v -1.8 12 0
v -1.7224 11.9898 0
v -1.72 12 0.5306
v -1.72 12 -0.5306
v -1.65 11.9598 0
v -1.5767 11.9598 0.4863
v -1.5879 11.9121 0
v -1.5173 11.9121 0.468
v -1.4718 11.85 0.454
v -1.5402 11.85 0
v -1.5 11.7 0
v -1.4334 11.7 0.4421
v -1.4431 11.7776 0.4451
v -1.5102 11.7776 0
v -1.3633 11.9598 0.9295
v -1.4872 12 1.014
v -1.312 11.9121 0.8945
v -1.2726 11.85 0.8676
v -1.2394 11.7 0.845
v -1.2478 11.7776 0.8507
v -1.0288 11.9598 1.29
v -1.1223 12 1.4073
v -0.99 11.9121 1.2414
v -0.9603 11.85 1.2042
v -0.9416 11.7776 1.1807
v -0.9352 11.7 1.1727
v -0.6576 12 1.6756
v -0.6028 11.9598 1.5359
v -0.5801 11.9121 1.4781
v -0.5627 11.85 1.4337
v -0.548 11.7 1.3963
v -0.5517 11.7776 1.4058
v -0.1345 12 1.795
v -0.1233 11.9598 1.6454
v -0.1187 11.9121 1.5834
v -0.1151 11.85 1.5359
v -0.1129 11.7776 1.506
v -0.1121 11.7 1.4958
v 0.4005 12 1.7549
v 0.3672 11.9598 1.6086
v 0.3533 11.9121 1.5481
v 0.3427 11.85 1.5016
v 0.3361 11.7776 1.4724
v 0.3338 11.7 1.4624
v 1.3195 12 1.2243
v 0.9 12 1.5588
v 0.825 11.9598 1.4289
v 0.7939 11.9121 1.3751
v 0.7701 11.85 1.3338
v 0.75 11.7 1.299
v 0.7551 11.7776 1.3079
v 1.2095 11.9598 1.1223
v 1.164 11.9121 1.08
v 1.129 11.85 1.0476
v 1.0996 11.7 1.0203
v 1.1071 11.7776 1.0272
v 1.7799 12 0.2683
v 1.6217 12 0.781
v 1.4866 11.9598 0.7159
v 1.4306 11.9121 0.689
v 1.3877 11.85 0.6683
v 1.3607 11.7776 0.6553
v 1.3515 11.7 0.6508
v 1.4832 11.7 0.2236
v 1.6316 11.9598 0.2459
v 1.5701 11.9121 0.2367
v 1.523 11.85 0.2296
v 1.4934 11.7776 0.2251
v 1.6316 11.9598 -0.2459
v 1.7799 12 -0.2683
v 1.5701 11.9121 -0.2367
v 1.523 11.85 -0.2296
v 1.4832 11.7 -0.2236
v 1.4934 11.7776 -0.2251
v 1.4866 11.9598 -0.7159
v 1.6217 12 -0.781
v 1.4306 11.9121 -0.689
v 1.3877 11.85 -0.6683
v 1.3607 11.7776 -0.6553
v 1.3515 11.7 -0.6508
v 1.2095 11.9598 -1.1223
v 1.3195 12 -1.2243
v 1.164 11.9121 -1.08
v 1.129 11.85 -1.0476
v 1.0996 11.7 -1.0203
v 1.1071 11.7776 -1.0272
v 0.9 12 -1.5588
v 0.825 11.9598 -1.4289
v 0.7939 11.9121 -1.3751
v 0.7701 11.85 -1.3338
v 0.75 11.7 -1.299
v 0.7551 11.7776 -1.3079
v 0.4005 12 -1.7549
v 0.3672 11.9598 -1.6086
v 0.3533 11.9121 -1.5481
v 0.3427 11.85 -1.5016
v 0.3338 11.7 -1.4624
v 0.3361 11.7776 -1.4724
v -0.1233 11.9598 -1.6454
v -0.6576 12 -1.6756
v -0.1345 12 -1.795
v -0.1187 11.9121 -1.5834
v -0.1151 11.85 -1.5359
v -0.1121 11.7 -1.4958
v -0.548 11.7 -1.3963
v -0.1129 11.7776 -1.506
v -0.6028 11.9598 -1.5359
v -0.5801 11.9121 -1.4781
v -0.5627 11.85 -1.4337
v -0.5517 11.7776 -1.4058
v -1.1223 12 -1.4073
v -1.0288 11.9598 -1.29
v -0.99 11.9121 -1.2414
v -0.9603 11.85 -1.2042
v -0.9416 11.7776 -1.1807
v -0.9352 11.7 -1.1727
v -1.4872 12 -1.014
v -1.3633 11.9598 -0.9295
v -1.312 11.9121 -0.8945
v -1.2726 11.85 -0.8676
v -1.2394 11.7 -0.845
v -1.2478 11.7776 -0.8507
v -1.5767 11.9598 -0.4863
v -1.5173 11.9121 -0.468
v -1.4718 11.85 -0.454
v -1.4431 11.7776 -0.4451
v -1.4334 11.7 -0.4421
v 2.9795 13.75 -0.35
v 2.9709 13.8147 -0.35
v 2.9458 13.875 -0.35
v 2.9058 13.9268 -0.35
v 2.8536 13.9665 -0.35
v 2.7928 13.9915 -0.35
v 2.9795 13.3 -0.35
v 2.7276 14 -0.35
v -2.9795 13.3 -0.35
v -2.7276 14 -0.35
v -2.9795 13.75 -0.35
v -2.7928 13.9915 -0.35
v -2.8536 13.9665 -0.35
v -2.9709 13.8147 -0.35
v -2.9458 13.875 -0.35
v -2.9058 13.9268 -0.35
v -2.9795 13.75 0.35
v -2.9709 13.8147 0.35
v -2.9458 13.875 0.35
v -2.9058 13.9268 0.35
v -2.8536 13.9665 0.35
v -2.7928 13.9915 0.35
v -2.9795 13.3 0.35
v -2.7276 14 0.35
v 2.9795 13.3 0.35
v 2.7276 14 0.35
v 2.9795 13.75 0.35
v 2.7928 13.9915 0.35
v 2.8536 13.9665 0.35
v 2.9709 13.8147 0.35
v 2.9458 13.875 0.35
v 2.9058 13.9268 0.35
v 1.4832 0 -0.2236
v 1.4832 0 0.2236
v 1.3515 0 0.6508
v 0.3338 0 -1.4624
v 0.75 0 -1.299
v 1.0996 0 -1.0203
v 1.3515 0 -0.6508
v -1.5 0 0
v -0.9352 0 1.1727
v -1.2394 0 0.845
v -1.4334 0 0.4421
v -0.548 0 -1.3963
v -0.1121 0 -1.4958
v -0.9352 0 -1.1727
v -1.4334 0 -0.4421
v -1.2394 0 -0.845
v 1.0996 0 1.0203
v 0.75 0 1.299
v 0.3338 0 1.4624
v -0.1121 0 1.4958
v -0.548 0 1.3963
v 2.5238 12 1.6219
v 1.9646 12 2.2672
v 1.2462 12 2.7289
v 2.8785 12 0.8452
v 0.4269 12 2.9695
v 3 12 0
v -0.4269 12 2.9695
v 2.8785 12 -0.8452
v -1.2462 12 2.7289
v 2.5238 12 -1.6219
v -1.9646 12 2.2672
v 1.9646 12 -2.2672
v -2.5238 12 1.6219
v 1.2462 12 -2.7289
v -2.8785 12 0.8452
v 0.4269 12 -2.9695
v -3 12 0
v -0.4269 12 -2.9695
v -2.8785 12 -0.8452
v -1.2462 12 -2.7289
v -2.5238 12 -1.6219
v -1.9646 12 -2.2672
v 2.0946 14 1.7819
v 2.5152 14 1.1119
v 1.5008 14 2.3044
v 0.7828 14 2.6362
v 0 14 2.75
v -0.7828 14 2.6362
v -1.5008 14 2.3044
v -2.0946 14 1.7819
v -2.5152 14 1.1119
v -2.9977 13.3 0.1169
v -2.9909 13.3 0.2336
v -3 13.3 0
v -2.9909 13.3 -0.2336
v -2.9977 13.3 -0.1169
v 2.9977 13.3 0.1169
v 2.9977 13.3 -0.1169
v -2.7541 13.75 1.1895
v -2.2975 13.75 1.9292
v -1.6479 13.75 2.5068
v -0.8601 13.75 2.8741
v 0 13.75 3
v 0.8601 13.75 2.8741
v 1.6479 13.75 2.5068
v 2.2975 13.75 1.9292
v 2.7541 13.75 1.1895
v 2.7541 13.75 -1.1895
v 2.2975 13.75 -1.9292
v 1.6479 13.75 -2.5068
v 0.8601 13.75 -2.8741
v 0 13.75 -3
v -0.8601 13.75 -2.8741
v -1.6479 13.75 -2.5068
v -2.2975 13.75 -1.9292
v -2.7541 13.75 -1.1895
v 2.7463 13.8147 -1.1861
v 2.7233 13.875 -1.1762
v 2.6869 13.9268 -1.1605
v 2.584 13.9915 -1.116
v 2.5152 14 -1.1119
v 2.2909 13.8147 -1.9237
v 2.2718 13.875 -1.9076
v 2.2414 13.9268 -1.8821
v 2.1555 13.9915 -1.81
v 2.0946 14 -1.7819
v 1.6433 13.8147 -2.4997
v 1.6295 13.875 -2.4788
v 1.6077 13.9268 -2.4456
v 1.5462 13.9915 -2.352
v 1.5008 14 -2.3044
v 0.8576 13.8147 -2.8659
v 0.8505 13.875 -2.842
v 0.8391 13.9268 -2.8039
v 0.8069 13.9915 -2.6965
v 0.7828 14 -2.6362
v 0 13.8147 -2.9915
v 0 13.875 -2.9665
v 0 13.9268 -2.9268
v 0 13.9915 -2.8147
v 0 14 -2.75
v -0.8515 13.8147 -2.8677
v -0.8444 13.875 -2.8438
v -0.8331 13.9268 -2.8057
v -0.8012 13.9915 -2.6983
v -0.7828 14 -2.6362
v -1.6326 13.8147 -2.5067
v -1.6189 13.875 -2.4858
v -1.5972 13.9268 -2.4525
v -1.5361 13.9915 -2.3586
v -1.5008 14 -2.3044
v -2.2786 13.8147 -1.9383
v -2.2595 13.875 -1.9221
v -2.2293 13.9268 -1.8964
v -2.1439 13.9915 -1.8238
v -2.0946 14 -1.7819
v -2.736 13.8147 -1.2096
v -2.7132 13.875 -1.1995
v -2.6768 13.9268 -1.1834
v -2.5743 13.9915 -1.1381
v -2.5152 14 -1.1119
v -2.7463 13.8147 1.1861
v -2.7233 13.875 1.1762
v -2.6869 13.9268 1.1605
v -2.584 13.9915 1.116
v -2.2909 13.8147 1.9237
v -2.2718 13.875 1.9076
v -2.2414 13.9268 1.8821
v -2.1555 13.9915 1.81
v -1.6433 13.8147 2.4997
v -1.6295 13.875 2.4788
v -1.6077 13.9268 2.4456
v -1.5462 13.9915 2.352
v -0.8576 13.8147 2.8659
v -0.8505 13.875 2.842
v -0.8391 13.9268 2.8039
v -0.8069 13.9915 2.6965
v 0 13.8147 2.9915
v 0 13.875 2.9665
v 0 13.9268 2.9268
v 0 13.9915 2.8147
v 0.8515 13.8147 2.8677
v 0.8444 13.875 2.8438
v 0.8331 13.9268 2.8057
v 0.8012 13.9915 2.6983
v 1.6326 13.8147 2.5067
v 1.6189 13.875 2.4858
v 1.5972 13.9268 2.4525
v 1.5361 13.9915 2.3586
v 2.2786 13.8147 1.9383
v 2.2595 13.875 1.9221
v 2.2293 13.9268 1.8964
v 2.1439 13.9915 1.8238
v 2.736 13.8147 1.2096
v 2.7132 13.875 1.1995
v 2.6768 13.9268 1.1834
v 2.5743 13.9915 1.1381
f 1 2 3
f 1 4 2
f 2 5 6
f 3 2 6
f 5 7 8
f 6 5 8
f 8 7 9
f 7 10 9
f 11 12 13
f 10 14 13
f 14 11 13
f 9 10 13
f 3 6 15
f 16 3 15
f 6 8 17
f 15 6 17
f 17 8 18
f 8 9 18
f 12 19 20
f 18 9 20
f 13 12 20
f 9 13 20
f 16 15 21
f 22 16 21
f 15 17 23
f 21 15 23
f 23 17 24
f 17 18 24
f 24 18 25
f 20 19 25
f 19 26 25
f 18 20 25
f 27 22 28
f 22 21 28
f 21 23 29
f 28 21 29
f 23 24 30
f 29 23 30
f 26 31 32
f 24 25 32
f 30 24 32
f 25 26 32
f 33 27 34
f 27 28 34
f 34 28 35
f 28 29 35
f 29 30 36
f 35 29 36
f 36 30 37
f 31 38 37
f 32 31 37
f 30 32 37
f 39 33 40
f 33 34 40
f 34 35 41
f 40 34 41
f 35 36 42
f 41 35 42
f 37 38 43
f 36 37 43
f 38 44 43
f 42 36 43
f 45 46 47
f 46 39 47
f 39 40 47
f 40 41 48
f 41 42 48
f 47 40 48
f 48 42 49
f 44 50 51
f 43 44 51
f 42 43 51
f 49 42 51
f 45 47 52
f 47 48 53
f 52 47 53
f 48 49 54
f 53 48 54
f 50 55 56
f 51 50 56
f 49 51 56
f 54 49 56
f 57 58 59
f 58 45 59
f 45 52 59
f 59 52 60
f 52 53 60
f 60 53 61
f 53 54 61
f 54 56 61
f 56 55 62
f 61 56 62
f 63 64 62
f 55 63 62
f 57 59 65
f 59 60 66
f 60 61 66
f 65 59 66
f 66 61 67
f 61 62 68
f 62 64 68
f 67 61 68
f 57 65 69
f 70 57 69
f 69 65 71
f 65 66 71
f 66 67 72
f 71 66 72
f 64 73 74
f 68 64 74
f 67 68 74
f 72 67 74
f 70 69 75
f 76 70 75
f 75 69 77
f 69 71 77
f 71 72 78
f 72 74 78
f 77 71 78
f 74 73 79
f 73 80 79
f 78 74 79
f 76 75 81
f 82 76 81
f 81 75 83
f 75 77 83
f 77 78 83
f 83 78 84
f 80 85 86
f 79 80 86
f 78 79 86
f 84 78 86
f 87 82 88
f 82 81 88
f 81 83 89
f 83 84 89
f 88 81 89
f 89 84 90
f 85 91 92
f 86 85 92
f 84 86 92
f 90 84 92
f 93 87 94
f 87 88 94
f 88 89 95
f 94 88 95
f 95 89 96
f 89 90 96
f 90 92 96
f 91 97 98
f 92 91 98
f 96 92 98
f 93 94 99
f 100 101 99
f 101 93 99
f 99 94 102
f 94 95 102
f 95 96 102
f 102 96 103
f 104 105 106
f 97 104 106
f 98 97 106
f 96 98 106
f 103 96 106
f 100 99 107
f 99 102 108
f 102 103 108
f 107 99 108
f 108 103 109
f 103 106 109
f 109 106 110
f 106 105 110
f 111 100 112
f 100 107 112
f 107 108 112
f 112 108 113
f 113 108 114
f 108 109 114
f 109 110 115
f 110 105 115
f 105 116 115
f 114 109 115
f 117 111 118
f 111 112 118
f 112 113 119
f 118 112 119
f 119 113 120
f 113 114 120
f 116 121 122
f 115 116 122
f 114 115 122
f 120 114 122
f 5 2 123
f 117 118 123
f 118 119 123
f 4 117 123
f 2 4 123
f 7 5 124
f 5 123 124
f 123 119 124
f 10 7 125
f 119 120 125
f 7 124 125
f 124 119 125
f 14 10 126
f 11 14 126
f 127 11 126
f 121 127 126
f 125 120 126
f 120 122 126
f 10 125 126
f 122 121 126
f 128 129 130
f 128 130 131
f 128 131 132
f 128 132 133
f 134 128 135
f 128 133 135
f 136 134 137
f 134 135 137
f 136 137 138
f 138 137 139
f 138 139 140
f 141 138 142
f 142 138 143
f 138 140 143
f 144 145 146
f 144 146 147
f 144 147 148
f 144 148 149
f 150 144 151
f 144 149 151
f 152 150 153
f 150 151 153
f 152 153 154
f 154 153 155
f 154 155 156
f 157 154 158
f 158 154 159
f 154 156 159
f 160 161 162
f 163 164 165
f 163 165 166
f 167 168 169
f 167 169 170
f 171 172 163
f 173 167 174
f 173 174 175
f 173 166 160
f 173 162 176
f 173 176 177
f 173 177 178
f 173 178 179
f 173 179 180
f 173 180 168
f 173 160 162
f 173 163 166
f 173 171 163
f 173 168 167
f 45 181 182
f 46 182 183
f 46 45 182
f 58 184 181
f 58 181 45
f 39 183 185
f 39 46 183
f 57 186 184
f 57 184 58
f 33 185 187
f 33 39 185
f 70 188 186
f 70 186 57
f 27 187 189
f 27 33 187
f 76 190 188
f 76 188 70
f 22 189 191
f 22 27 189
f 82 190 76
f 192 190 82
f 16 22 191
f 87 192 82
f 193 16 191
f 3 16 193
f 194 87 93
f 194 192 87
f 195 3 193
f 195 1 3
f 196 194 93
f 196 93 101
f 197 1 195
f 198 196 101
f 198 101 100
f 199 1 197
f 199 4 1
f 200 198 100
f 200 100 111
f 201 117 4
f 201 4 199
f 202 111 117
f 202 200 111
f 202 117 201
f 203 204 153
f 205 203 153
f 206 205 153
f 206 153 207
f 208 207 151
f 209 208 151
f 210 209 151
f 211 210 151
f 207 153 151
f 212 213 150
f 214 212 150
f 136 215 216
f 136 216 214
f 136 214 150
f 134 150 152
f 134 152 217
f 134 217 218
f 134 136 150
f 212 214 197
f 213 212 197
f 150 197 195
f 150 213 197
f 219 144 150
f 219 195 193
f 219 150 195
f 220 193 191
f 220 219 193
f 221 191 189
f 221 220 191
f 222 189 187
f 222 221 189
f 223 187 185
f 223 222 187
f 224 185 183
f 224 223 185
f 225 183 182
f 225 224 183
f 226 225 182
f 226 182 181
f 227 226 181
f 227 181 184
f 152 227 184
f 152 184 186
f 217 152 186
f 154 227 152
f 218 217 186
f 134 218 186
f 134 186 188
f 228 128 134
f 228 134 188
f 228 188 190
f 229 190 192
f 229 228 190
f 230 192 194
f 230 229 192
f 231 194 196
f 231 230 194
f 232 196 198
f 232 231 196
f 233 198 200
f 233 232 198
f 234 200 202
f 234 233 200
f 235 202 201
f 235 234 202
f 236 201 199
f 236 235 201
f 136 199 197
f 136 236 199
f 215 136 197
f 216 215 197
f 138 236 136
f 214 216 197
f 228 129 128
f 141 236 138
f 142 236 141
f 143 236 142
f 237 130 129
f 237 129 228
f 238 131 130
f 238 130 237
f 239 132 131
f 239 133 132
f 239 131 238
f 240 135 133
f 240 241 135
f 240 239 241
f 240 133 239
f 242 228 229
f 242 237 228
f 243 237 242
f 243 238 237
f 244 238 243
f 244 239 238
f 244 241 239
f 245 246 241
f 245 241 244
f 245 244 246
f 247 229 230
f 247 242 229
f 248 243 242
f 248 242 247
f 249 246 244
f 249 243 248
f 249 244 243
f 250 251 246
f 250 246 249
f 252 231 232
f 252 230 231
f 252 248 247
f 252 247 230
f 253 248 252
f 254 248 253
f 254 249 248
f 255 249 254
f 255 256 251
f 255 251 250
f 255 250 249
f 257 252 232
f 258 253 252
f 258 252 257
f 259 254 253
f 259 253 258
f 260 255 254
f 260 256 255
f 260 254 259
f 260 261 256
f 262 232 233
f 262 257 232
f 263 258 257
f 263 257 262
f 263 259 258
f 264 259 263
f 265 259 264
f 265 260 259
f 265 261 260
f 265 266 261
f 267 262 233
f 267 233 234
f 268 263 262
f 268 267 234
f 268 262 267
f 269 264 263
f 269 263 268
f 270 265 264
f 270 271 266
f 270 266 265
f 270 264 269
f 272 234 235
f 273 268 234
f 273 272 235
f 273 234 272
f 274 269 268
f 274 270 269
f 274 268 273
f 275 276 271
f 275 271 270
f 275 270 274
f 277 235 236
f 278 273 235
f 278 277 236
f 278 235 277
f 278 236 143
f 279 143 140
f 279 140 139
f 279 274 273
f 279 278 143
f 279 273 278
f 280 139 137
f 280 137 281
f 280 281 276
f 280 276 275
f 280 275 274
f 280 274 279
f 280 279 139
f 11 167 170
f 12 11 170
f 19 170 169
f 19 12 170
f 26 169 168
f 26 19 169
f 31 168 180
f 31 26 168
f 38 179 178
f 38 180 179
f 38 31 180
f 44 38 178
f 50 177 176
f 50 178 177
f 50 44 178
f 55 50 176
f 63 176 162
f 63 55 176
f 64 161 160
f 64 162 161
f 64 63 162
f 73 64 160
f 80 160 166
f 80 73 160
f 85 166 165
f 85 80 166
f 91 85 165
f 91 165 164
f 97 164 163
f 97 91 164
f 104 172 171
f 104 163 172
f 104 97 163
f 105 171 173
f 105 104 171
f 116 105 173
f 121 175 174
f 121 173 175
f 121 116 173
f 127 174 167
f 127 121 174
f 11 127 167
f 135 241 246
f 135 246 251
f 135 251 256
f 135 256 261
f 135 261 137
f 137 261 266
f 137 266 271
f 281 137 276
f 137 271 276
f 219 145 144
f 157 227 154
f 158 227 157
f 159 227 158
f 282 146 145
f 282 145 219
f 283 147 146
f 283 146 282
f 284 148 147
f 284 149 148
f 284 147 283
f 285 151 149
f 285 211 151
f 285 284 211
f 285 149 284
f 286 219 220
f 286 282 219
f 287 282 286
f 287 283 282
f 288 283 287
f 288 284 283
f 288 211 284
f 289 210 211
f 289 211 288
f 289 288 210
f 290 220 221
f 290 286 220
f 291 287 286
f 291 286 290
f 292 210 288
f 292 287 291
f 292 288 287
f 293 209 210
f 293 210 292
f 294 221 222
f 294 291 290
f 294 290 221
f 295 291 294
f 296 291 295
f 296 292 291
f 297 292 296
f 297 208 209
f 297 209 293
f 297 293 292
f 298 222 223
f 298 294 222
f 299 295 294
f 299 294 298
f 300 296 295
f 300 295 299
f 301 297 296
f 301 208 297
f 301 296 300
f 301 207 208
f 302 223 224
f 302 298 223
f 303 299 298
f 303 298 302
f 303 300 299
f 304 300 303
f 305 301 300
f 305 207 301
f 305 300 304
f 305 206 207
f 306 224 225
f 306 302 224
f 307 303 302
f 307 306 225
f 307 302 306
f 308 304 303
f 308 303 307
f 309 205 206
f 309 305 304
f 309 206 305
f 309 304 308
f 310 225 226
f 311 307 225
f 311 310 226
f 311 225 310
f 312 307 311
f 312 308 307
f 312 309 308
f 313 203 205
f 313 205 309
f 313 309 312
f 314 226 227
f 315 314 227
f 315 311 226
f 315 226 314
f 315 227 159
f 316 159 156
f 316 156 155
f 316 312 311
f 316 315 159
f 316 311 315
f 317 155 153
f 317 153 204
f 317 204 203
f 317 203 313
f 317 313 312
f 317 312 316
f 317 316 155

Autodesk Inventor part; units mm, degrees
ref_plane "YZ Plane" through (0, 0, 0) normal (1, 0, 0) x (0, 1, 0)
ref_plane "XZ Plane" through (0, 0, 0) normal (0, 1, 0) x (-1, 0, 0)
ref_plane "XY Plane" through (0, 0, 0) normal (0, 0, 1) x (1, 0, 0)
sketch "Sketch1" plane through (0, 0, 0) normal (0, 0, 1) x (1, 0, 0)
  line L0 (0, 0) -> (-1.5, 0)
  line L1 (-1.5, 0) -> (-1.5, 11)
  line L2 (-1.5, 11) -> (-1.5, 11)
  line L3 (-1.5, 11) -> (-1.5, 12)
  line L4 (-1.5, 12) -> (-3, 12)
  line L5 (-3, 12) -> (-3, 14)
  line L6 (-3, 14) -> (0, 14)
  line L7 (0, 14) -> (0, 0)
  dimension "d0" = 2
  dimension "d1" = 3
  dimension "d2" = 1.5
  dimension "d3" = 0
  dimension "d4" = 1
  dimension "d5" = 14
  dimension "d6" = 90
revolve "Revolution1" add sketch "Sketch1" angle 360 about axis through (0, 14, 0) along (0, -1, 0)
thread "Thread1" size "M3x0.5" class "6g" standard "ANSI Metric M Profile" length 27
sketch "Sketch2" plane through (0, 14, 0) normal (0, 1, 0) x (1, 0, 0)
  line L0 (5, 0.35) -> (-5, 0.35)
  line L1 (-5, 0.35) -> (-5, -0.35)
  line L2 (-5, -0.35) -> (5, -0.35)
  line L3 (5, -0.35) -> (5, 0.35)
  line L4 (5, 0.35) -> (-5, -0.35) construction
  line L5 (-5, 0.35) -> (5, -0.35) construction
  point P0 (0, 0)
  dimension "d10" = 10
  dimension "d11" = 0.7
fillet "Fillet1" radius 0.25 1 edges at (3, 14, 0)
extrude "Extrusion2" cut sketch "Sketch2" against normal blind 0.7
fillet "Fillet2" radius 0.3 1 edges at (1.5, 12, 0)
properties part number "TorsionOscillator-Screw-M3-Brass-CheeseHead-12mm-Std" material "Brass, Soft Yellow"
